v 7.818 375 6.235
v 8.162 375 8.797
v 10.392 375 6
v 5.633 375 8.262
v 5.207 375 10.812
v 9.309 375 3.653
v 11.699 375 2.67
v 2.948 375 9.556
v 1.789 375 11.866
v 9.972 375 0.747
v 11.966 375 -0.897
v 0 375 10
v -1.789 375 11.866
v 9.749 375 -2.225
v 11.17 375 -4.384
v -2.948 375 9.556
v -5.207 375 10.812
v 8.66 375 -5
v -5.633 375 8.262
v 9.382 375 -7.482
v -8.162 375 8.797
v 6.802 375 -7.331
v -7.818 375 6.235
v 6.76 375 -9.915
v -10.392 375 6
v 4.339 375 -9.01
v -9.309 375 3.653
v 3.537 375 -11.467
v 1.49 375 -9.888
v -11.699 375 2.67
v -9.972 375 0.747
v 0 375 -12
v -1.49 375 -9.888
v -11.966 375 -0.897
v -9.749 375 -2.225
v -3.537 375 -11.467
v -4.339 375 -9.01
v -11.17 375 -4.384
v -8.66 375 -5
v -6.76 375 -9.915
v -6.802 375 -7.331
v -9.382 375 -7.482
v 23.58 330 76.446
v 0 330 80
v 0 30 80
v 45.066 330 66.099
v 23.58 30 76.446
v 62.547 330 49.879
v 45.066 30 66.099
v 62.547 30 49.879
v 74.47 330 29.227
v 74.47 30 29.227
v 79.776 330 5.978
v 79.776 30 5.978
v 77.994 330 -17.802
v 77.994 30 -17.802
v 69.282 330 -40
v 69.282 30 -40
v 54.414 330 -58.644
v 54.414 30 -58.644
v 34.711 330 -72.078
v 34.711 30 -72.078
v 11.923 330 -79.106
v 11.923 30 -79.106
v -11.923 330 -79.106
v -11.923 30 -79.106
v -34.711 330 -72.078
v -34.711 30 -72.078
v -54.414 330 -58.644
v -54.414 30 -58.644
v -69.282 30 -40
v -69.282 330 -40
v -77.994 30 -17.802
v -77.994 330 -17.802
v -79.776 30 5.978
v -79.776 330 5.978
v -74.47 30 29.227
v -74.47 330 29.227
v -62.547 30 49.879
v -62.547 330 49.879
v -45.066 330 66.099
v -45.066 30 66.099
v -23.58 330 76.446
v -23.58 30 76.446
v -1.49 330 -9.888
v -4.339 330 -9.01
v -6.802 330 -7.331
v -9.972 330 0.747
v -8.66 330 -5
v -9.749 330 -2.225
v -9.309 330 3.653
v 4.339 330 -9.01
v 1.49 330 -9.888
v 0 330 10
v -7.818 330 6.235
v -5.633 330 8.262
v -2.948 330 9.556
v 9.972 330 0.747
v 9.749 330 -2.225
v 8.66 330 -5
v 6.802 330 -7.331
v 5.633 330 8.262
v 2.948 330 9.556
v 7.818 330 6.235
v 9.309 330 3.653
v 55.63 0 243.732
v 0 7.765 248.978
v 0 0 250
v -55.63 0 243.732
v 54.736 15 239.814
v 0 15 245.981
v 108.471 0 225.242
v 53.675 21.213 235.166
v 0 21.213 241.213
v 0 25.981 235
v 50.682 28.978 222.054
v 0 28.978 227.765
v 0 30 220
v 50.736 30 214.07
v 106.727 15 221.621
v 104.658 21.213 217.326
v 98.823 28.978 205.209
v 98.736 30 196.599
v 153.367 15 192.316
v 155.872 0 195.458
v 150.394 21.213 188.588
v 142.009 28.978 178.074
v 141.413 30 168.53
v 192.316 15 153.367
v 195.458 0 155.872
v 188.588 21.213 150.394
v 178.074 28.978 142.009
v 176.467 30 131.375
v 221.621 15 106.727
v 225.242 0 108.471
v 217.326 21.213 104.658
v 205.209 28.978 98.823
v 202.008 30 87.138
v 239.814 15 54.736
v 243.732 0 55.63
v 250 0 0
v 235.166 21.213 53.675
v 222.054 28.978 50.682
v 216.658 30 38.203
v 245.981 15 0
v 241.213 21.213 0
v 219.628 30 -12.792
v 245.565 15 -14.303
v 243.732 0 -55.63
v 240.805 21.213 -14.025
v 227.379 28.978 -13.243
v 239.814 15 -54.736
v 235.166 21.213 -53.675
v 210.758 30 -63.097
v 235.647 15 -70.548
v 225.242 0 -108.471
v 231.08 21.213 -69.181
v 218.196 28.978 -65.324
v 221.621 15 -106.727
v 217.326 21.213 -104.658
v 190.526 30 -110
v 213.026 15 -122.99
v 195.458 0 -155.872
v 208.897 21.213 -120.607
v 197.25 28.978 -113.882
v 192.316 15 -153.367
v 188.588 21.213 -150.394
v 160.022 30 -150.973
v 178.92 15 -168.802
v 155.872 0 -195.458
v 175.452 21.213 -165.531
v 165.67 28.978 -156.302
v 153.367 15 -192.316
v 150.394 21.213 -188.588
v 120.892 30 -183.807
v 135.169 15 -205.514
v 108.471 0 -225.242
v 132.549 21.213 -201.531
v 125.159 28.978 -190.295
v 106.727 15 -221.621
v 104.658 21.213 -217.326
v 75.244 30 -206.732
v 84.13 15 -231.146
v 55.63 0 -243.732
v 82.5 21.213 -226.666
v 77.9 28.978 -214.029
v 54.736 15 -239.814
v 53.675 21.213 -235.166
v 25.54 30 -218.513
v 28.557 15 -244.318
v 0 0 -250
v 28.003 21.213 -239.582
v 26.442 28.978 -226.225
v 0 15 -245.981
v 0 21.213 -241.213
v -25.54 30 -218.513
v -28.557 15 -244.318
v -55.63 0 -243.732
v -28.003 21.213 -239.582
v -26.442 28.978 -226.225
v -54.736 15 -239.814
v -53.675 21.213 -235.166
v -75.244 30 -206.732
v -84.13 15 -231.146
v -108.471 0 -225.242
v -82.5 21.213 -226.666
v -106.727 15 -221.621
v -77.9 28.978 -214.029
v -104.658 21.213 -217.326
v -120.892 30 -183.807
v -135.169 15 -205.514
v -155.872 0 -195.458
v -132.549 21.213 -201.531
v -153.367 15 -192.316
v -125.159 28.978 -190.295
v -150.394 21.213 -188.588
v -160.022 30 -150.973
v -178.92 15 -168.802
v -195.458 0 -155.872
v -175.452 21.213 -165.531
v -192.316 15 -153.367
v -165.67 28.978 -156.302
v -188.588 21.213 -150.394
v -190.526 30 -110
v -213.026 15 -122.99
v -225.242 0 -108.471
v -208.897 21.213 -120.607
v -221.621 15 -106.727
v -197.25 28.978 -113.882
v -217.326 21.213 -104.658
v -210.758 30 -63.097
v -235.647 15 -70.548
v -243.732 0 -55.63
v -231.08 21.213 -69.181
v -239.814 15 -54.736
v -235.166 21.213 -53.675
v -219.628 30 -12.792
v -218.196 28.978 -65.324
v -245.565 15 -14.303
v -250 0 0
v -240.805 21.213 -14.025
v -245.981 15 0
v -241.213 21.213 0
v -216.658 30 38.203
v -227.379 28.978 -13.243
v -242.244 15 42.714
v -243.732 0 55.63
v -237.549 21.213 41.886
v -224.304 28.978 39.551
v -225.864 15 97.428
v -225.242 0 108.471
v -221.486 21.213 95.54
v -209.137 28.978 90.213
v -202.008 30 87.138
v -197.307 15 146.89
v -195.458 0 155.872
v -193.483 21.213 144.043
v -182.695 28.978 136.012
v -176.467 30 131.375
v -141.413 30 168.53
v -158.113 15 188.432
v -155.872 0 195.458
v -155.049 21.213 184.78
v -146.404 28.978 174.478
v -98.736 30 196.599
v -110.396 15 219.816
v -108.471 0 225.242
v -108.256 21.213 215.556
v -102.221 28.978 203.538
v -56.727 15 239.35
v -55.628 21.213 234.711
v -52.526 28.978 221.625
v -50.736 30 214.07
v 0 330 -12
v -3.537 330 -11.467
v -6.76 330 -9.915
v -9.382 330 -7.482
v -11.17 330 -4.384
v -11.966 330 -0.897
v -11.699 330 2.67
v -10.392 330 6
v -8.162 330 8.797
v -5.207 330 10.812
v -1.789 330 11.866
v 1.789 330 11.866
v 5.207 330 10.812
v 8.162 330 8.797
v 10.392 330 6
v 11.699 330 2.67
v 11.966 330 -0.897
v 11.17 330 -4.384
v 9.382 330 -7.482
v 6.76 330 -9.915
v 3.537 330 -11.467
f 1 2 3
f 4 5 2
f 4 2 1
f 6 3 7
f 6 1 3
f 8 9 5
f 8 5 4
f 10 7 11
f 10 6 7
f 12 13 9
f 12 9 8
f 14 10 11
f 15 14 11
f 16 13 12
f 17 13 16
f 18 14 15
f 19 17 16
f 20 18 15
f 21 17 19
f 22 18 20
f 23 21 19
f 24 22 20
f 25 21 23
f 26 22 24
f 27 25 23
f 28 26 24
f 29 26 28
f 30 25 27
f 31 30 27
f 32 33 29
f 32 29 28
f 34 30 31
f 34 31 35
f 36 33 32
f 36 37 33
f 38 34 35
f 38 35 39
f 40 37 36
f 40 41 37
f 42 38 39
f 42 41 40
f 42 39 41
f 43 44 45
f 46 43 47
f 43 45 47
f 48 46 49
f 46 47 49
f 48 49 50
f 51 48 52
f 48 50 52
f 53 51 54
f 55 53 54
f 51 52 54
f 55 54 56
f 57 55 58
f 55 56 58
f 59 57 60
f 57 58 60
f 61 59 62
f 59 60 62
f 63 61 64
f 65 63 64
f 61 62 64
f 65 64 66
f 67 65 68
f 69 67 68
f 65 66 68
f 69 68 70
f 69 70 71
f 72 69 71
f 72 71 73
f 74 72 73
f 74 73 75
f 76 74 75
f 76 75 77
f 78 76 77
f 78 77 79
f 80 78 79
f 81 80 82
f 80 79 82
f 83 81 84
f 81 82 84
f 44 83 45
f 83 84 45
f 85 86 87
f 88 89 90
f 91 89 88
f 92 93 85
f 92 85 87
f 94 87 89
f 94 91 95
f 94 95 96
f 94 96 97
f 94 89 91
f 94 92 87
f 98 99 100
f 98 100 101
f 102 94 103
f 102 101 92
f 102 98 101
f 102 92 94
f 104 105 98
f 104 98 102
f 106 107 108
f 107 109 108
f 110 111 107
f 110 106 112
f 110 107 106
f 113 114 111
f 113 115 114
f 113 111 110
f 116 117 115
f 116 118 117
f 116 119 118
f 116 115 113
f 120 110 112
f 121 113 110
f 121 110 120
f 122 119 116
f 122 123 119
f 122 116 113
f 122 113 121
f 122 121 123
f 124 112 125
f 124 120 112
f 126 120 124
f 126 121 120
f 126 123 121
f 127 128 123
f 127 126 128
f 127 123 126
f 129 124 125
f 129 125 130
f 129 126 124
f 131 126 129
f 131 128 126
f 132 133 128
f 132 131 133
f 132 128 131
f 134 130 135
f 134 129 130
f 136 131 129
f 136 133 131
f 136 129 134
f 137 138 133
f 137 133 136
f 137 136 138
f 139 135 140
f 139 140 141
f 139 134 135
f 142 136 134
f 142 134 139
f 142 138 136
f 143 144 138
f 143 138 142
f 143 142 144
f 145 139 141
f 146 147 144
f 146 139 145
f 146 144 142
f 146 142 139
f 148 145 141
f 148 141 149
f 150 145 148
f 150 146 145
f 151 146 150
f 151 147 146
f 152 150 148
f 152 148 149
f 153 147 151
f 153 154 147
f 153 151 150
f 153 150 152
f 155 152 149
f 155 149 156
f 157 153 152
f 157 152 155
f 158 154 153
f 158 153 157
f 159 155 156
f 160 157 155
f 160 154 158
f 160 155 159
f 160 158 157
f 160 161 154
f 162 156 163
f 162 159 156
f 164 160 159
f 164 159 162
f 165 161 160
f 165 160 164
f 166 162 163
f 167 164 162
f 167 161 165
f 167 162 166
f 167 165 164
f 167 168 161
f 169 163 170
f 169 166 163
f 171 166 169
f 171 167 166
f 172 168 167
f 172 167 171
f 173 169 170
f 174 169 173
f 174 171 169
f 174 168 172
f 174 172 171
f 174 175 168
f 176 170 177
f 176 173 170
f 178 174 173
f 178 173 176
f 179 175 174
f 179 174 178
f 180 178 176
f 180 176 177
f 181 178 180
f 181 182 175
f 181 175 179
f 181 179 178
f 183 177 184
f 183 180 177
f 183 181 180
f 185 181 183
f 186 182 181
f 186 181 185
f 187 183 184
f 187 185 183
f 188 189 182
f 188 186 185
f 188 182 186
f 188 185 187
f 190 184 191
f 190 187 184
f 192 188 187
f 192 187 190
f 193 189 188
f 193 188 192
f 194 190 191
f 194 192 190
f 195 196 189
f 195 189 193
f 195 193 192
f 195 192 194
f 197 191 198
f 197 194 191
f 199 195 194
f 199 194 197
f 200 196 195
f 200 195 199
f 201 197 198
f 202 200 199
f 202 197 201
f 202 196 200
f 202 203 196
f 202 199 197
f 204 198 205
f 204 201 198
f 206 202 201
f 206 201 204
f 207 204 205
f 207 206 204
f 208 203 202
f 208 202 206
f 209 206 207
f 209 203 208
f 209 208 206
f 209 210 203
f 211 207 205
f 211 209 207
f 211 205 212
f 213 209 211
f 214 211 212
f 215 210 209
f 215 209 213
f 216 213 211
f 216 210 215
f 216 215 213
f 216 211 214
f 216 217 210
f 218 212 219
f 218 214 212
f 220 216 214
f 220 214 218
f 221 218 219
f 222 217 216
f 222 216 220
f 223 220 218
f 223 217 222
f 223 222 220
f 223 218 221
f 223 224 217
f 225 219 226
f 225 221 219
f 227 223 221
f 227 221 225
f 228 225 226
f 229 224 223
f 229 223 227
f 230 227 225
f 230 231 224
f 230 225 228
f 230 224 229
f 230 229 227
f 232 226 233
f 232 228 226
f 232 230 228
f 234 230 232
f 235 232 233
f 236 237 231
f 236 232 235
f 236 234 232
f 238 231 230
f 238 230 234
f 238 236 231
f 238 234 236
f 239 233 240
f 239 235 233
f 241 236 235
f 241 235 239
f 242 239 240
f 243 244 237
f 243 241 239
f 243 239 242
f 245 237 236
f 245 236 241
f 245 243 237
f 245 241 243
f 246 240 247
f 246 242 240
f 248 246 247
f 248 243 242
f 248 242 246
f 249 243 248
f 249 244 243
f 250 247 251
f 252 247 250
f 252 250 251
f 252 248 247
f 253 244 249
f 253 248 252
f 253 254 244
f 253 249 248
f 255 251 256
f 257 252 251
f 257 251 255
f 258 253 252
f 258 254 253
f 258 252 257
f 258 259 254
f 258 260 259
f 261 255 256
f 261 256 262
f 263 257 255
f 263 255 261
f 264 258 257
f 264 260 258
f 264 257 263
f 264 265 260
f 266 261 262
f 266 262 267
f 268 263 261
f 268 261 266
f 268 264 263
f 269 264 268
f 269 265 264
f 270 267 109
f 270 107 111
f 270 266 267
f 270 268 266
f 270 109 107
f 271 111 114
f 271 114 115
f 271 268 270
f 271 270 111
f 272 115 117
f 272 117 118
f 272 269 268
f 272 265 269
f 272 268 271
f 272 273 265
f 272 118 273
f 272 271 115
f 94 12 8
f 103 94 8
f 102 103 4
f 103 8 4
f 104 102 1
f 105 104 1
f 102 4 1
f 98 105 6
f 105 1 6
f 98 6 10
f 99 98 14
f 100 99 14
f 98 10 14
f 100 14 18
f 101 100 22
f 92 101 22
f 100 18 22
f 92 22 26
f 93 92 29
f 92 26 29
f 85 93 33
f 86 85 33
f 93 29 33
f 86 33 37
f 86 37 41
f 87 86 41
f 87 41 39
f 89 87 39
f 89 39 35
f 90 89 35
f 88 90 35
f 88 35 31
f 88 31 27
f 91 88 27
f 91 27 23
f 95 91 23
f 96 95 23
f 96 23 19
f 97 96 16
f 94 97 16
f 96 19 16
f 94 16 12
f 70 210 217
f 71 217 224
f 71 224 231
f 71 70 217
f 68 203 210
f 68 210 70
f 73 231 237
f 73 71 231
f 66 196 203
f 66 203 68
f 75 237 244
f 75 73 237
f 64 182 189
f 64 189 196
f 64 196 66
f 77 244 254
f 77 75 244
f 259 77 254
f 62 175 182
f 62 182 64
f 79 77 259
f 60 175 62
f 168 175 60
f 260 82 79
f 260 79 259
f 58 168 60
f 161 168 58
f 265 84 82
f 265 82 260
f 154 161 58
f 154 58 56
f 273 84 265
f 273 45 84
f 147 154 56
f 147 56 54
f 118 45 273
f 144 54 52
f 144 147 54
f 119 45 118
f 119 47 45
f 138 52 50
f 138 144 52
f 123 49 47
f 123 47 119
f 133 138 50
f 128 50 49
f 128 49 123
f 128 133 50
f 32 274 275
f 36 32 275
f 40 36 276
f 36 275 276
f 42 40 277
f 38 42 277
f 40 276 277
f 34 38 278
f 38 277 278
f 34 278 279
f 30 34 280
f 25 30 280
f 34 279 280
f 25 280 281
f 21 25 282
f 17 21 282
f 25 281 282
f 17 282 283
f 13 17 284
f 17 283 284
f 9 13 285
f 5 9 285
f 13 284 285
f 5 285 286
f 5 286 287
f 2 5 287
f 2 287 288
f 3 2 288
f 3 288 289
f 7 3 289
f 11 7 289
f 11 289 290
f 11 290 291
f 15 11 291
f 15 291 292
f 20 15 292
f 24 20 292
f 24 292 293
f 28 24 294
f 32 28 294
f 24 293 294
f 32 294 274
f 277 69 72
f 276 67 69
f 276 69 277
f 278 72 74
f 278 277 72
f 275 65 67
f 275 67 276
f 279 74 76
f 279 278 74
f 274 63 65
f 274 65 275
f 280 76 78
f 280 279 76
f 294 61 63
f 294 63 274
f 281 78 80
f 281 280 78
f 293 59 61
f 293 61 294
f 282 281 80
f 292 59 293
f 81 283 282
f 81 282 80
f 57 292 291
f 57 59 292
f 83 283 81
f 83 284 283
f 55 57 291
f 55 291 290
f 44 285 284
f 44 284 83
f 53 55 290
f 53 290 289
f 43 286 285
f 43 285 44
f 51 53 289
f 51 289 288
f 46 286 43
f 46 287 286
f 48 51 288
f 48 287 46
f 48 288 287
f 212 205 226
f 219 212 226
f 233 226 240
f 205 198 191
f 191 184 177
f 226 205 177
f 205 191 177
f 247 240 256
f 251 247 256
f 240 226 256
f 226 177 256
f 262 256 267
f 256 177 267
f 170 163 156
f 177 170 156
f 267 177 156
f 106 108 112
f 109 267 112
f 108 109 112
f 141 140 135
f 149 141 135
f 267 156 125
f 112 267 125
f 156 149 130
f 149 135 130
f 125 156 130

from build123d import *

# Parameters (mm, degrees)
SKETCH_1_R          = 250
EXTRUDE_2_DEPTH     = 30
FILLET_1_R          = 30
SKETCH_4_R          = 80
EXTRUDE_4_DEPTH     = 300
SKETCH_5_R          = 12
EXTRUDE_6_DEPTH     = 45
SKETCH_6_R          = 10
CUT_EXTRUDE_2_DEPTH = 45


with BuildPart() as part:
    # 草图1 → 凸台-拉伸2 (new body)
    with BuildSketch(Plane(origin=(0, 0, 0), x_dir=(1, 0, 0), z_dir=(0, 1, 0))):
        with Locations(Location((0, 0, 0), (0, 0, 270))):
            Circle(SKETCH_1_R)
    extrude(amount=EXTRUDE_2_DEPTH)

    # 圆角1
    fillet_1_edges = [part.edges().sort_by_distance(p)[0] for p in [
        (0, 30, -250),
    ]]
    fillet(fillet_1_edges, radius=FILLET_1_R - 0.0001)  # a hair under: the kernel refuses the full size

    # 草图4 → 凸台-拉伸4 (add)
    with BuildSketch(Plane(origin=(0, 30, 0), x_dir=(1, 0, 0), z_dir=(0, 1, 0))):
        with Locations(Location((0, 0, 0), (0, 0, 270))):
            Circle(SKETCH_4_R)
    extrude(amount=EXTRUDE_4_DEPTH)

    # 草图5 → 凸台-拉伸6 (add)
    with BuildSketch(Plane(origin=(0, 330, 0), x_dir=(1, 0, 0), z_dir=(0, 1, 0))):
        with Locations(Location((0, 0, 0), (0, 0, 90))):
            Circle(SKETCH_5_R)
    extrude(amount=EXTRUDE_6_DEPTH)

    # 草图6 → 切除-拉伸2 (cut)
    with BuildSketch(Plane(origin=(0, 375, 0), x_dir=(1, 0, 0), z_dir=(0, 1, 0))):
        with Locations(Location((0, 0, 0), (0, 0, 270))):
            Circle(SKETCH_6_R)
    extrude(amount=-CUT_EXTRUDE_2_DEPTH, mode=Mode.SUBTRACT)


solid = part.part
